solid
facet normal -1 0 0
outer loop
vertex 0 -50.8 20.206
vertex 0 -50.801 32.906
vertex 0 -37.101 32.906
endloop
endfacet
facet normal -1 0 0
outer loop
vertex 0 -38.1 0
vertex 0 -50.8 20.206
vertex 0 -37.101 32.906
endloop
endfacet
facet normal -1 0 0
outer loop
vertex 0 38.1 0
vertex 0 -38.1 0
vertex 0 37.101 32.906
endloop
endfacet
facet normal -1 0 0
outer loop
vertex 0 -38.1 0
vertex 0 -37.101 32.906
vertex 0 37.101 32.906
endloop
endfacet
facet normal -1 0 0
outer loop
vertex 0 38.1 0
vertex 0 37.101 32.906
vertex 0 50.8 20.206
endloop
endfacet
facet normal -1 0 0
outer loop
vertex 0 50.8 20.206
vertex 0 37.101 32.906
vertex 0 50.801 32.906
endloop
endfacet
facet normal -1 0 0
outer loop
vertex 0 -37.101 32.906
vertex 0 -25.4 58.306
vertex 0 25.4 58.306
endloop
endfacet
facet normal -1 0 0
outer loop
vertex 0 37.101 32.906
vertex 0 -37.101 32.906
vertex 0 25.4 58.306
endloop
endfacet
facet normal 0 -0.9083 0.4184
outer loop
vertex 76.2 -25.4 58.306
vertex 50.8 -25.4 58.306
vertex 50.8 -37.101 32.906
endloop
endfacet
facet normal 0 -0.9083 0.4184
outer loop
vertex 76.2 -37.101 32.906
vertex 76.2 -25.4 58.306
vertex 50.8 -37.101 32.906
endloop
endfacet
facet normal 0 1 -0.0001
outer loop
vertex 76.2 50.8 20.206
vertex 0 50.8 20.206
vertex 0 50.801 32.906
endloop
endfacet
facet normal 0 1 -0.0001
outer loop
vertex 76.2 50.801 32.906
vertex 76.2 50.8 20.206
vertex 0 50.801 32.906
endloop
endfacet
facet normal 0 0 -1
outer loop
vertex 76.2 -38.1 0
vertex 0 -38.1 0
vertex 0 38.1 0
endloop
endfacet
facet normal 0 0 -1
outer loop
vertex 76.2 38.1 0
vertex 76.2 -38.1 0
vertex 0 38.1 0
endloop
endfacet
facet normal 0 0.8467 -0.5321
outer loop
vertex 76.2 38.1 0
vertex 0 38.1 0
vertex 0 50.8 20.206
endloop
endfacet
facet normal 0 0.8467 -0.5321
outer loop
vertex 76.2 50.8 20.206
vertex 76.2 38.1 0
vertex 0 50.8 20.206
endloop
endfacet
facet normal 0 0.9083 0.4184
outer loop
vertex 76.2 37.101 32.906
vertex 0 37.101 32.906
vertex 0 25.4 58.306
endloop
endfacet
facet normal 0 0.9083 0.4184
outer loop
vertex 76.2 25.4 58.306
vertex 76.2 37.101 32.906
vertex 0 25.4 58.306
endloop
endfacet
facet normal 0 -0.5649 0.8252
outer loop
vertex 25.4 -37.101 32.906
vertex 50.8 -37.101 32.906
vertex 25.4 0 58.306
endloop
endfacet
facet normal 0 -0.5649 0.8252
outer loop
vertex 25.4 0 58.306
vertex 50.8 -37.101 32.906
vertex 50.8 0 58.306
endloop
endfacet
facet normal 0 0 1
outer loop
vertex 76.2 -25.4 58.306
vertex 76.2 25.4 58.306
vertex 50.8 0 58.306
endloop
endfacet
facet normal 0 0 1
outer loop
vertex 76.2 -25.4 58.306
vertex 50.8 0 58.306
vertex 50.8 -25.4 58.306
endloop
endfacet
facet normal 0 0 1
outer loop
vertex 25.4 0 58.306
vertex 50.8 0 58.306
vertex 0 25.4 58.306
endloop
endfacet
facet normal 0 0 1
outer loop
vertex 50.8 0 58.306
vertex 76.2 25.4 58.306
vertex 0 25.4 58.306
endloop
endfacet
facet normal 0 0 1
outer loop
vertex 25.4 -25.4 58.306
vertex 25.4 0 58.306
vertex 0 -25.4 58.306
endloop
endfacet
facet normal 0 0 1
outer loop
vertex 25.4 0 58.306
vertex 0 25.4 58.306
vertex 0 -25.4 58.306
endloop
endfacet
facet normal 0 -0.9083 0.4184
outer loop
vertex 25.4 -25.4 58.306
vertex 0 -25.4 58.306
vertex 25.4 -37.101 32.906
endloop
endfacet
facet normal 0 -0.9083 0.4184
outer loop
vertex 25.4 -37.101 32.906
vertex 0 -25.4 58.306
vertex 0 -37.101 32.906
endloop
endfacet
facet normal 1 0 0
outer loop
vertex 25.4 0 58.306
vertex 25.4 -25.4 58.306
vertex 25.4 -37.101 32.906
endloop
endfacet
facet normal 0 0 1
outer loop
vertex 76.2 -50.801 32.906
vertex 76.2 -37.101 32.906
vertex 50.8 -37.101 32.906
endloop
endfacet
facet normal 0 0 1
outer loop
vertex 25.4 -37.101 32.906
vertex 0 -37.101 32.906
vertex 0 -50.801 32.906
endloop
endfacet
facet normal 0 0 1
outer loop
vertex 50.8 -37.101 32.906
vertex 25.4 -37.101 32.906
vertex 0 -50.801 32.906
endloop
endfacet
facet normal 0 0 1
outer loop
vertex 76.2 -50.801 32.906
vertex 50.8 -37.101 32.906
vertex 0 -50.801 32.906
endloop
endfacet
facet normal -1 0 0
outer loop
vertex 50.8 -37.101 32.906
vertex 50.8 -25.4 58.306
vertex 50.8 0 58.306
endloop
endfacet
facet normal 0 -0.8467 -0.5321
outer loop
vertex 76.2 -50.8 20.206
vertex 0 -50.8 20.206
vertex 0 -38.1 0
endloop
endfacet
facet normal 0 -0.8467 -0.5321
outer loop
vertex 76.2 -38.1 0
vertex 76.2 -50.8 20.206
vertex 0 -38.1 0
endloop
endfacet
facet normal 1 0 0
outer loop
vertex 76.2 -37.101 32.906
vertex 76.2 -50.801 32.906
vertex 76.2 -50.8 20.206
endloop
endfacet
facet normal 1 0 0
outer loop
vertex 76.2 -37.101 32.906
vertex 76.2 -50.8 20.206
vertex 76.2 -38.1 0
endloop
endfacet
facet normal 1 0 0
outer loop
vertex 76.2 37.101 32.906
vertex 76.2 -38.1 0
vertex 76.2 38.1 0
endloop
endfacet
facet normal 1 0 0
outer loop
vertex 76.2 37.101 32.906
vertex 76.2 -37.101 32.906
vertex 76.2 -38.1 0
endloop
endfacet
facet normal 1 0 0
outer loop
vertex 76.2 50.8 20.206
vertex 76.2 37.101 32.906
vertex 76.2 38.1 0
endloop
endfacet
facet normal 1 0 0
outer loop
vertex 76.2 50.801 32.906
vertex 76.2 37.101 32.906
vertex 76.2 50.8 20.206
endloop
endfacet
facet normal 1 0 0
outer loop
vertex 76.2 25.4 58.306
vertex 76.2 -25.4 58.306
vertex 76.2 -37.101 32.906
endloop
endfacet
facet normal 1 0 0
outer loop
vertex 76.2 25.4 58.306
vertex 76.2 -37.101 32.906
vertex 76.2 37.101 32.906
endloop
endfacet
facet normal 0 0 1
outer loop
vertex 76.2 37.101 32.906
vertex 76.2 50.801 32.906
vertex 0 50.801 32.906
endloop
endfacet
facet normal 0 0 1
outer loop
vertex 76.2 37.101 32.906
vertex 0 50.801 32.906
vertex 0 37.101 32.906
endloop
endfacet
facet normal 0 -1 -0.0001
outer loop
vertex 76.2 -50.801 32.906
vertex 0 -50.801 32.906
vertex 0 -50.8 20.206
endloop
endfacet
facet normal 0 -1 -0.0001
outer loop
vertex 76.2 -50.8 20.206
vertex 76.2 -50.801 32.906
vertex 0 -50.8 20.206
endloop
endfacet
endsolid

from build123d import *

# Parameters (mm, degrees)
F1_DEPTH      = 76.2
F4_DEPTH      = 12.7
F4_DEPTH_BACK = 12.7


with BuildPart() as f1:
    # F0 (on Right) → F1 (new body)
    with BuildSketch(Plane.YZ):
        Polygon((-38.1, 0), (0, 0), (0, 58.3063843763), (-25.4, 58.3063843763), (-37.1005810608, 32.9063843763), (-50.8005463281, 32.9057950318), (-50.8, 20.2057950318), align=None)
        Polygon((0, 58.3063843763), (0, 0), (38.1, 0), (50.8, 20.2057950318), (50.8005463281, 32.9057950318), (37.1005810608, 32.9063843763), (25.4, 58.3063843763), align=None)
    extrude(amount=F1_DEPTH)

    # F3 (on mid) → F4 (cut, two sides)
    with BuildSketch(Plane.YZ.offset(38.1)) as f4_sk:
        Polygon((0, 58.3063843763), (-25.4, 58.3063843763), (-37.1005810608, 32.9063843763), align=None)
    extrude(amount=-F4_DEPTH, mode=Mode.SUBTRACT)
    extrude(f4_sk.sketch, amount=F4_DEPTH_BACK, mode=Mode.SUBTRACT)


solid = f1.part
